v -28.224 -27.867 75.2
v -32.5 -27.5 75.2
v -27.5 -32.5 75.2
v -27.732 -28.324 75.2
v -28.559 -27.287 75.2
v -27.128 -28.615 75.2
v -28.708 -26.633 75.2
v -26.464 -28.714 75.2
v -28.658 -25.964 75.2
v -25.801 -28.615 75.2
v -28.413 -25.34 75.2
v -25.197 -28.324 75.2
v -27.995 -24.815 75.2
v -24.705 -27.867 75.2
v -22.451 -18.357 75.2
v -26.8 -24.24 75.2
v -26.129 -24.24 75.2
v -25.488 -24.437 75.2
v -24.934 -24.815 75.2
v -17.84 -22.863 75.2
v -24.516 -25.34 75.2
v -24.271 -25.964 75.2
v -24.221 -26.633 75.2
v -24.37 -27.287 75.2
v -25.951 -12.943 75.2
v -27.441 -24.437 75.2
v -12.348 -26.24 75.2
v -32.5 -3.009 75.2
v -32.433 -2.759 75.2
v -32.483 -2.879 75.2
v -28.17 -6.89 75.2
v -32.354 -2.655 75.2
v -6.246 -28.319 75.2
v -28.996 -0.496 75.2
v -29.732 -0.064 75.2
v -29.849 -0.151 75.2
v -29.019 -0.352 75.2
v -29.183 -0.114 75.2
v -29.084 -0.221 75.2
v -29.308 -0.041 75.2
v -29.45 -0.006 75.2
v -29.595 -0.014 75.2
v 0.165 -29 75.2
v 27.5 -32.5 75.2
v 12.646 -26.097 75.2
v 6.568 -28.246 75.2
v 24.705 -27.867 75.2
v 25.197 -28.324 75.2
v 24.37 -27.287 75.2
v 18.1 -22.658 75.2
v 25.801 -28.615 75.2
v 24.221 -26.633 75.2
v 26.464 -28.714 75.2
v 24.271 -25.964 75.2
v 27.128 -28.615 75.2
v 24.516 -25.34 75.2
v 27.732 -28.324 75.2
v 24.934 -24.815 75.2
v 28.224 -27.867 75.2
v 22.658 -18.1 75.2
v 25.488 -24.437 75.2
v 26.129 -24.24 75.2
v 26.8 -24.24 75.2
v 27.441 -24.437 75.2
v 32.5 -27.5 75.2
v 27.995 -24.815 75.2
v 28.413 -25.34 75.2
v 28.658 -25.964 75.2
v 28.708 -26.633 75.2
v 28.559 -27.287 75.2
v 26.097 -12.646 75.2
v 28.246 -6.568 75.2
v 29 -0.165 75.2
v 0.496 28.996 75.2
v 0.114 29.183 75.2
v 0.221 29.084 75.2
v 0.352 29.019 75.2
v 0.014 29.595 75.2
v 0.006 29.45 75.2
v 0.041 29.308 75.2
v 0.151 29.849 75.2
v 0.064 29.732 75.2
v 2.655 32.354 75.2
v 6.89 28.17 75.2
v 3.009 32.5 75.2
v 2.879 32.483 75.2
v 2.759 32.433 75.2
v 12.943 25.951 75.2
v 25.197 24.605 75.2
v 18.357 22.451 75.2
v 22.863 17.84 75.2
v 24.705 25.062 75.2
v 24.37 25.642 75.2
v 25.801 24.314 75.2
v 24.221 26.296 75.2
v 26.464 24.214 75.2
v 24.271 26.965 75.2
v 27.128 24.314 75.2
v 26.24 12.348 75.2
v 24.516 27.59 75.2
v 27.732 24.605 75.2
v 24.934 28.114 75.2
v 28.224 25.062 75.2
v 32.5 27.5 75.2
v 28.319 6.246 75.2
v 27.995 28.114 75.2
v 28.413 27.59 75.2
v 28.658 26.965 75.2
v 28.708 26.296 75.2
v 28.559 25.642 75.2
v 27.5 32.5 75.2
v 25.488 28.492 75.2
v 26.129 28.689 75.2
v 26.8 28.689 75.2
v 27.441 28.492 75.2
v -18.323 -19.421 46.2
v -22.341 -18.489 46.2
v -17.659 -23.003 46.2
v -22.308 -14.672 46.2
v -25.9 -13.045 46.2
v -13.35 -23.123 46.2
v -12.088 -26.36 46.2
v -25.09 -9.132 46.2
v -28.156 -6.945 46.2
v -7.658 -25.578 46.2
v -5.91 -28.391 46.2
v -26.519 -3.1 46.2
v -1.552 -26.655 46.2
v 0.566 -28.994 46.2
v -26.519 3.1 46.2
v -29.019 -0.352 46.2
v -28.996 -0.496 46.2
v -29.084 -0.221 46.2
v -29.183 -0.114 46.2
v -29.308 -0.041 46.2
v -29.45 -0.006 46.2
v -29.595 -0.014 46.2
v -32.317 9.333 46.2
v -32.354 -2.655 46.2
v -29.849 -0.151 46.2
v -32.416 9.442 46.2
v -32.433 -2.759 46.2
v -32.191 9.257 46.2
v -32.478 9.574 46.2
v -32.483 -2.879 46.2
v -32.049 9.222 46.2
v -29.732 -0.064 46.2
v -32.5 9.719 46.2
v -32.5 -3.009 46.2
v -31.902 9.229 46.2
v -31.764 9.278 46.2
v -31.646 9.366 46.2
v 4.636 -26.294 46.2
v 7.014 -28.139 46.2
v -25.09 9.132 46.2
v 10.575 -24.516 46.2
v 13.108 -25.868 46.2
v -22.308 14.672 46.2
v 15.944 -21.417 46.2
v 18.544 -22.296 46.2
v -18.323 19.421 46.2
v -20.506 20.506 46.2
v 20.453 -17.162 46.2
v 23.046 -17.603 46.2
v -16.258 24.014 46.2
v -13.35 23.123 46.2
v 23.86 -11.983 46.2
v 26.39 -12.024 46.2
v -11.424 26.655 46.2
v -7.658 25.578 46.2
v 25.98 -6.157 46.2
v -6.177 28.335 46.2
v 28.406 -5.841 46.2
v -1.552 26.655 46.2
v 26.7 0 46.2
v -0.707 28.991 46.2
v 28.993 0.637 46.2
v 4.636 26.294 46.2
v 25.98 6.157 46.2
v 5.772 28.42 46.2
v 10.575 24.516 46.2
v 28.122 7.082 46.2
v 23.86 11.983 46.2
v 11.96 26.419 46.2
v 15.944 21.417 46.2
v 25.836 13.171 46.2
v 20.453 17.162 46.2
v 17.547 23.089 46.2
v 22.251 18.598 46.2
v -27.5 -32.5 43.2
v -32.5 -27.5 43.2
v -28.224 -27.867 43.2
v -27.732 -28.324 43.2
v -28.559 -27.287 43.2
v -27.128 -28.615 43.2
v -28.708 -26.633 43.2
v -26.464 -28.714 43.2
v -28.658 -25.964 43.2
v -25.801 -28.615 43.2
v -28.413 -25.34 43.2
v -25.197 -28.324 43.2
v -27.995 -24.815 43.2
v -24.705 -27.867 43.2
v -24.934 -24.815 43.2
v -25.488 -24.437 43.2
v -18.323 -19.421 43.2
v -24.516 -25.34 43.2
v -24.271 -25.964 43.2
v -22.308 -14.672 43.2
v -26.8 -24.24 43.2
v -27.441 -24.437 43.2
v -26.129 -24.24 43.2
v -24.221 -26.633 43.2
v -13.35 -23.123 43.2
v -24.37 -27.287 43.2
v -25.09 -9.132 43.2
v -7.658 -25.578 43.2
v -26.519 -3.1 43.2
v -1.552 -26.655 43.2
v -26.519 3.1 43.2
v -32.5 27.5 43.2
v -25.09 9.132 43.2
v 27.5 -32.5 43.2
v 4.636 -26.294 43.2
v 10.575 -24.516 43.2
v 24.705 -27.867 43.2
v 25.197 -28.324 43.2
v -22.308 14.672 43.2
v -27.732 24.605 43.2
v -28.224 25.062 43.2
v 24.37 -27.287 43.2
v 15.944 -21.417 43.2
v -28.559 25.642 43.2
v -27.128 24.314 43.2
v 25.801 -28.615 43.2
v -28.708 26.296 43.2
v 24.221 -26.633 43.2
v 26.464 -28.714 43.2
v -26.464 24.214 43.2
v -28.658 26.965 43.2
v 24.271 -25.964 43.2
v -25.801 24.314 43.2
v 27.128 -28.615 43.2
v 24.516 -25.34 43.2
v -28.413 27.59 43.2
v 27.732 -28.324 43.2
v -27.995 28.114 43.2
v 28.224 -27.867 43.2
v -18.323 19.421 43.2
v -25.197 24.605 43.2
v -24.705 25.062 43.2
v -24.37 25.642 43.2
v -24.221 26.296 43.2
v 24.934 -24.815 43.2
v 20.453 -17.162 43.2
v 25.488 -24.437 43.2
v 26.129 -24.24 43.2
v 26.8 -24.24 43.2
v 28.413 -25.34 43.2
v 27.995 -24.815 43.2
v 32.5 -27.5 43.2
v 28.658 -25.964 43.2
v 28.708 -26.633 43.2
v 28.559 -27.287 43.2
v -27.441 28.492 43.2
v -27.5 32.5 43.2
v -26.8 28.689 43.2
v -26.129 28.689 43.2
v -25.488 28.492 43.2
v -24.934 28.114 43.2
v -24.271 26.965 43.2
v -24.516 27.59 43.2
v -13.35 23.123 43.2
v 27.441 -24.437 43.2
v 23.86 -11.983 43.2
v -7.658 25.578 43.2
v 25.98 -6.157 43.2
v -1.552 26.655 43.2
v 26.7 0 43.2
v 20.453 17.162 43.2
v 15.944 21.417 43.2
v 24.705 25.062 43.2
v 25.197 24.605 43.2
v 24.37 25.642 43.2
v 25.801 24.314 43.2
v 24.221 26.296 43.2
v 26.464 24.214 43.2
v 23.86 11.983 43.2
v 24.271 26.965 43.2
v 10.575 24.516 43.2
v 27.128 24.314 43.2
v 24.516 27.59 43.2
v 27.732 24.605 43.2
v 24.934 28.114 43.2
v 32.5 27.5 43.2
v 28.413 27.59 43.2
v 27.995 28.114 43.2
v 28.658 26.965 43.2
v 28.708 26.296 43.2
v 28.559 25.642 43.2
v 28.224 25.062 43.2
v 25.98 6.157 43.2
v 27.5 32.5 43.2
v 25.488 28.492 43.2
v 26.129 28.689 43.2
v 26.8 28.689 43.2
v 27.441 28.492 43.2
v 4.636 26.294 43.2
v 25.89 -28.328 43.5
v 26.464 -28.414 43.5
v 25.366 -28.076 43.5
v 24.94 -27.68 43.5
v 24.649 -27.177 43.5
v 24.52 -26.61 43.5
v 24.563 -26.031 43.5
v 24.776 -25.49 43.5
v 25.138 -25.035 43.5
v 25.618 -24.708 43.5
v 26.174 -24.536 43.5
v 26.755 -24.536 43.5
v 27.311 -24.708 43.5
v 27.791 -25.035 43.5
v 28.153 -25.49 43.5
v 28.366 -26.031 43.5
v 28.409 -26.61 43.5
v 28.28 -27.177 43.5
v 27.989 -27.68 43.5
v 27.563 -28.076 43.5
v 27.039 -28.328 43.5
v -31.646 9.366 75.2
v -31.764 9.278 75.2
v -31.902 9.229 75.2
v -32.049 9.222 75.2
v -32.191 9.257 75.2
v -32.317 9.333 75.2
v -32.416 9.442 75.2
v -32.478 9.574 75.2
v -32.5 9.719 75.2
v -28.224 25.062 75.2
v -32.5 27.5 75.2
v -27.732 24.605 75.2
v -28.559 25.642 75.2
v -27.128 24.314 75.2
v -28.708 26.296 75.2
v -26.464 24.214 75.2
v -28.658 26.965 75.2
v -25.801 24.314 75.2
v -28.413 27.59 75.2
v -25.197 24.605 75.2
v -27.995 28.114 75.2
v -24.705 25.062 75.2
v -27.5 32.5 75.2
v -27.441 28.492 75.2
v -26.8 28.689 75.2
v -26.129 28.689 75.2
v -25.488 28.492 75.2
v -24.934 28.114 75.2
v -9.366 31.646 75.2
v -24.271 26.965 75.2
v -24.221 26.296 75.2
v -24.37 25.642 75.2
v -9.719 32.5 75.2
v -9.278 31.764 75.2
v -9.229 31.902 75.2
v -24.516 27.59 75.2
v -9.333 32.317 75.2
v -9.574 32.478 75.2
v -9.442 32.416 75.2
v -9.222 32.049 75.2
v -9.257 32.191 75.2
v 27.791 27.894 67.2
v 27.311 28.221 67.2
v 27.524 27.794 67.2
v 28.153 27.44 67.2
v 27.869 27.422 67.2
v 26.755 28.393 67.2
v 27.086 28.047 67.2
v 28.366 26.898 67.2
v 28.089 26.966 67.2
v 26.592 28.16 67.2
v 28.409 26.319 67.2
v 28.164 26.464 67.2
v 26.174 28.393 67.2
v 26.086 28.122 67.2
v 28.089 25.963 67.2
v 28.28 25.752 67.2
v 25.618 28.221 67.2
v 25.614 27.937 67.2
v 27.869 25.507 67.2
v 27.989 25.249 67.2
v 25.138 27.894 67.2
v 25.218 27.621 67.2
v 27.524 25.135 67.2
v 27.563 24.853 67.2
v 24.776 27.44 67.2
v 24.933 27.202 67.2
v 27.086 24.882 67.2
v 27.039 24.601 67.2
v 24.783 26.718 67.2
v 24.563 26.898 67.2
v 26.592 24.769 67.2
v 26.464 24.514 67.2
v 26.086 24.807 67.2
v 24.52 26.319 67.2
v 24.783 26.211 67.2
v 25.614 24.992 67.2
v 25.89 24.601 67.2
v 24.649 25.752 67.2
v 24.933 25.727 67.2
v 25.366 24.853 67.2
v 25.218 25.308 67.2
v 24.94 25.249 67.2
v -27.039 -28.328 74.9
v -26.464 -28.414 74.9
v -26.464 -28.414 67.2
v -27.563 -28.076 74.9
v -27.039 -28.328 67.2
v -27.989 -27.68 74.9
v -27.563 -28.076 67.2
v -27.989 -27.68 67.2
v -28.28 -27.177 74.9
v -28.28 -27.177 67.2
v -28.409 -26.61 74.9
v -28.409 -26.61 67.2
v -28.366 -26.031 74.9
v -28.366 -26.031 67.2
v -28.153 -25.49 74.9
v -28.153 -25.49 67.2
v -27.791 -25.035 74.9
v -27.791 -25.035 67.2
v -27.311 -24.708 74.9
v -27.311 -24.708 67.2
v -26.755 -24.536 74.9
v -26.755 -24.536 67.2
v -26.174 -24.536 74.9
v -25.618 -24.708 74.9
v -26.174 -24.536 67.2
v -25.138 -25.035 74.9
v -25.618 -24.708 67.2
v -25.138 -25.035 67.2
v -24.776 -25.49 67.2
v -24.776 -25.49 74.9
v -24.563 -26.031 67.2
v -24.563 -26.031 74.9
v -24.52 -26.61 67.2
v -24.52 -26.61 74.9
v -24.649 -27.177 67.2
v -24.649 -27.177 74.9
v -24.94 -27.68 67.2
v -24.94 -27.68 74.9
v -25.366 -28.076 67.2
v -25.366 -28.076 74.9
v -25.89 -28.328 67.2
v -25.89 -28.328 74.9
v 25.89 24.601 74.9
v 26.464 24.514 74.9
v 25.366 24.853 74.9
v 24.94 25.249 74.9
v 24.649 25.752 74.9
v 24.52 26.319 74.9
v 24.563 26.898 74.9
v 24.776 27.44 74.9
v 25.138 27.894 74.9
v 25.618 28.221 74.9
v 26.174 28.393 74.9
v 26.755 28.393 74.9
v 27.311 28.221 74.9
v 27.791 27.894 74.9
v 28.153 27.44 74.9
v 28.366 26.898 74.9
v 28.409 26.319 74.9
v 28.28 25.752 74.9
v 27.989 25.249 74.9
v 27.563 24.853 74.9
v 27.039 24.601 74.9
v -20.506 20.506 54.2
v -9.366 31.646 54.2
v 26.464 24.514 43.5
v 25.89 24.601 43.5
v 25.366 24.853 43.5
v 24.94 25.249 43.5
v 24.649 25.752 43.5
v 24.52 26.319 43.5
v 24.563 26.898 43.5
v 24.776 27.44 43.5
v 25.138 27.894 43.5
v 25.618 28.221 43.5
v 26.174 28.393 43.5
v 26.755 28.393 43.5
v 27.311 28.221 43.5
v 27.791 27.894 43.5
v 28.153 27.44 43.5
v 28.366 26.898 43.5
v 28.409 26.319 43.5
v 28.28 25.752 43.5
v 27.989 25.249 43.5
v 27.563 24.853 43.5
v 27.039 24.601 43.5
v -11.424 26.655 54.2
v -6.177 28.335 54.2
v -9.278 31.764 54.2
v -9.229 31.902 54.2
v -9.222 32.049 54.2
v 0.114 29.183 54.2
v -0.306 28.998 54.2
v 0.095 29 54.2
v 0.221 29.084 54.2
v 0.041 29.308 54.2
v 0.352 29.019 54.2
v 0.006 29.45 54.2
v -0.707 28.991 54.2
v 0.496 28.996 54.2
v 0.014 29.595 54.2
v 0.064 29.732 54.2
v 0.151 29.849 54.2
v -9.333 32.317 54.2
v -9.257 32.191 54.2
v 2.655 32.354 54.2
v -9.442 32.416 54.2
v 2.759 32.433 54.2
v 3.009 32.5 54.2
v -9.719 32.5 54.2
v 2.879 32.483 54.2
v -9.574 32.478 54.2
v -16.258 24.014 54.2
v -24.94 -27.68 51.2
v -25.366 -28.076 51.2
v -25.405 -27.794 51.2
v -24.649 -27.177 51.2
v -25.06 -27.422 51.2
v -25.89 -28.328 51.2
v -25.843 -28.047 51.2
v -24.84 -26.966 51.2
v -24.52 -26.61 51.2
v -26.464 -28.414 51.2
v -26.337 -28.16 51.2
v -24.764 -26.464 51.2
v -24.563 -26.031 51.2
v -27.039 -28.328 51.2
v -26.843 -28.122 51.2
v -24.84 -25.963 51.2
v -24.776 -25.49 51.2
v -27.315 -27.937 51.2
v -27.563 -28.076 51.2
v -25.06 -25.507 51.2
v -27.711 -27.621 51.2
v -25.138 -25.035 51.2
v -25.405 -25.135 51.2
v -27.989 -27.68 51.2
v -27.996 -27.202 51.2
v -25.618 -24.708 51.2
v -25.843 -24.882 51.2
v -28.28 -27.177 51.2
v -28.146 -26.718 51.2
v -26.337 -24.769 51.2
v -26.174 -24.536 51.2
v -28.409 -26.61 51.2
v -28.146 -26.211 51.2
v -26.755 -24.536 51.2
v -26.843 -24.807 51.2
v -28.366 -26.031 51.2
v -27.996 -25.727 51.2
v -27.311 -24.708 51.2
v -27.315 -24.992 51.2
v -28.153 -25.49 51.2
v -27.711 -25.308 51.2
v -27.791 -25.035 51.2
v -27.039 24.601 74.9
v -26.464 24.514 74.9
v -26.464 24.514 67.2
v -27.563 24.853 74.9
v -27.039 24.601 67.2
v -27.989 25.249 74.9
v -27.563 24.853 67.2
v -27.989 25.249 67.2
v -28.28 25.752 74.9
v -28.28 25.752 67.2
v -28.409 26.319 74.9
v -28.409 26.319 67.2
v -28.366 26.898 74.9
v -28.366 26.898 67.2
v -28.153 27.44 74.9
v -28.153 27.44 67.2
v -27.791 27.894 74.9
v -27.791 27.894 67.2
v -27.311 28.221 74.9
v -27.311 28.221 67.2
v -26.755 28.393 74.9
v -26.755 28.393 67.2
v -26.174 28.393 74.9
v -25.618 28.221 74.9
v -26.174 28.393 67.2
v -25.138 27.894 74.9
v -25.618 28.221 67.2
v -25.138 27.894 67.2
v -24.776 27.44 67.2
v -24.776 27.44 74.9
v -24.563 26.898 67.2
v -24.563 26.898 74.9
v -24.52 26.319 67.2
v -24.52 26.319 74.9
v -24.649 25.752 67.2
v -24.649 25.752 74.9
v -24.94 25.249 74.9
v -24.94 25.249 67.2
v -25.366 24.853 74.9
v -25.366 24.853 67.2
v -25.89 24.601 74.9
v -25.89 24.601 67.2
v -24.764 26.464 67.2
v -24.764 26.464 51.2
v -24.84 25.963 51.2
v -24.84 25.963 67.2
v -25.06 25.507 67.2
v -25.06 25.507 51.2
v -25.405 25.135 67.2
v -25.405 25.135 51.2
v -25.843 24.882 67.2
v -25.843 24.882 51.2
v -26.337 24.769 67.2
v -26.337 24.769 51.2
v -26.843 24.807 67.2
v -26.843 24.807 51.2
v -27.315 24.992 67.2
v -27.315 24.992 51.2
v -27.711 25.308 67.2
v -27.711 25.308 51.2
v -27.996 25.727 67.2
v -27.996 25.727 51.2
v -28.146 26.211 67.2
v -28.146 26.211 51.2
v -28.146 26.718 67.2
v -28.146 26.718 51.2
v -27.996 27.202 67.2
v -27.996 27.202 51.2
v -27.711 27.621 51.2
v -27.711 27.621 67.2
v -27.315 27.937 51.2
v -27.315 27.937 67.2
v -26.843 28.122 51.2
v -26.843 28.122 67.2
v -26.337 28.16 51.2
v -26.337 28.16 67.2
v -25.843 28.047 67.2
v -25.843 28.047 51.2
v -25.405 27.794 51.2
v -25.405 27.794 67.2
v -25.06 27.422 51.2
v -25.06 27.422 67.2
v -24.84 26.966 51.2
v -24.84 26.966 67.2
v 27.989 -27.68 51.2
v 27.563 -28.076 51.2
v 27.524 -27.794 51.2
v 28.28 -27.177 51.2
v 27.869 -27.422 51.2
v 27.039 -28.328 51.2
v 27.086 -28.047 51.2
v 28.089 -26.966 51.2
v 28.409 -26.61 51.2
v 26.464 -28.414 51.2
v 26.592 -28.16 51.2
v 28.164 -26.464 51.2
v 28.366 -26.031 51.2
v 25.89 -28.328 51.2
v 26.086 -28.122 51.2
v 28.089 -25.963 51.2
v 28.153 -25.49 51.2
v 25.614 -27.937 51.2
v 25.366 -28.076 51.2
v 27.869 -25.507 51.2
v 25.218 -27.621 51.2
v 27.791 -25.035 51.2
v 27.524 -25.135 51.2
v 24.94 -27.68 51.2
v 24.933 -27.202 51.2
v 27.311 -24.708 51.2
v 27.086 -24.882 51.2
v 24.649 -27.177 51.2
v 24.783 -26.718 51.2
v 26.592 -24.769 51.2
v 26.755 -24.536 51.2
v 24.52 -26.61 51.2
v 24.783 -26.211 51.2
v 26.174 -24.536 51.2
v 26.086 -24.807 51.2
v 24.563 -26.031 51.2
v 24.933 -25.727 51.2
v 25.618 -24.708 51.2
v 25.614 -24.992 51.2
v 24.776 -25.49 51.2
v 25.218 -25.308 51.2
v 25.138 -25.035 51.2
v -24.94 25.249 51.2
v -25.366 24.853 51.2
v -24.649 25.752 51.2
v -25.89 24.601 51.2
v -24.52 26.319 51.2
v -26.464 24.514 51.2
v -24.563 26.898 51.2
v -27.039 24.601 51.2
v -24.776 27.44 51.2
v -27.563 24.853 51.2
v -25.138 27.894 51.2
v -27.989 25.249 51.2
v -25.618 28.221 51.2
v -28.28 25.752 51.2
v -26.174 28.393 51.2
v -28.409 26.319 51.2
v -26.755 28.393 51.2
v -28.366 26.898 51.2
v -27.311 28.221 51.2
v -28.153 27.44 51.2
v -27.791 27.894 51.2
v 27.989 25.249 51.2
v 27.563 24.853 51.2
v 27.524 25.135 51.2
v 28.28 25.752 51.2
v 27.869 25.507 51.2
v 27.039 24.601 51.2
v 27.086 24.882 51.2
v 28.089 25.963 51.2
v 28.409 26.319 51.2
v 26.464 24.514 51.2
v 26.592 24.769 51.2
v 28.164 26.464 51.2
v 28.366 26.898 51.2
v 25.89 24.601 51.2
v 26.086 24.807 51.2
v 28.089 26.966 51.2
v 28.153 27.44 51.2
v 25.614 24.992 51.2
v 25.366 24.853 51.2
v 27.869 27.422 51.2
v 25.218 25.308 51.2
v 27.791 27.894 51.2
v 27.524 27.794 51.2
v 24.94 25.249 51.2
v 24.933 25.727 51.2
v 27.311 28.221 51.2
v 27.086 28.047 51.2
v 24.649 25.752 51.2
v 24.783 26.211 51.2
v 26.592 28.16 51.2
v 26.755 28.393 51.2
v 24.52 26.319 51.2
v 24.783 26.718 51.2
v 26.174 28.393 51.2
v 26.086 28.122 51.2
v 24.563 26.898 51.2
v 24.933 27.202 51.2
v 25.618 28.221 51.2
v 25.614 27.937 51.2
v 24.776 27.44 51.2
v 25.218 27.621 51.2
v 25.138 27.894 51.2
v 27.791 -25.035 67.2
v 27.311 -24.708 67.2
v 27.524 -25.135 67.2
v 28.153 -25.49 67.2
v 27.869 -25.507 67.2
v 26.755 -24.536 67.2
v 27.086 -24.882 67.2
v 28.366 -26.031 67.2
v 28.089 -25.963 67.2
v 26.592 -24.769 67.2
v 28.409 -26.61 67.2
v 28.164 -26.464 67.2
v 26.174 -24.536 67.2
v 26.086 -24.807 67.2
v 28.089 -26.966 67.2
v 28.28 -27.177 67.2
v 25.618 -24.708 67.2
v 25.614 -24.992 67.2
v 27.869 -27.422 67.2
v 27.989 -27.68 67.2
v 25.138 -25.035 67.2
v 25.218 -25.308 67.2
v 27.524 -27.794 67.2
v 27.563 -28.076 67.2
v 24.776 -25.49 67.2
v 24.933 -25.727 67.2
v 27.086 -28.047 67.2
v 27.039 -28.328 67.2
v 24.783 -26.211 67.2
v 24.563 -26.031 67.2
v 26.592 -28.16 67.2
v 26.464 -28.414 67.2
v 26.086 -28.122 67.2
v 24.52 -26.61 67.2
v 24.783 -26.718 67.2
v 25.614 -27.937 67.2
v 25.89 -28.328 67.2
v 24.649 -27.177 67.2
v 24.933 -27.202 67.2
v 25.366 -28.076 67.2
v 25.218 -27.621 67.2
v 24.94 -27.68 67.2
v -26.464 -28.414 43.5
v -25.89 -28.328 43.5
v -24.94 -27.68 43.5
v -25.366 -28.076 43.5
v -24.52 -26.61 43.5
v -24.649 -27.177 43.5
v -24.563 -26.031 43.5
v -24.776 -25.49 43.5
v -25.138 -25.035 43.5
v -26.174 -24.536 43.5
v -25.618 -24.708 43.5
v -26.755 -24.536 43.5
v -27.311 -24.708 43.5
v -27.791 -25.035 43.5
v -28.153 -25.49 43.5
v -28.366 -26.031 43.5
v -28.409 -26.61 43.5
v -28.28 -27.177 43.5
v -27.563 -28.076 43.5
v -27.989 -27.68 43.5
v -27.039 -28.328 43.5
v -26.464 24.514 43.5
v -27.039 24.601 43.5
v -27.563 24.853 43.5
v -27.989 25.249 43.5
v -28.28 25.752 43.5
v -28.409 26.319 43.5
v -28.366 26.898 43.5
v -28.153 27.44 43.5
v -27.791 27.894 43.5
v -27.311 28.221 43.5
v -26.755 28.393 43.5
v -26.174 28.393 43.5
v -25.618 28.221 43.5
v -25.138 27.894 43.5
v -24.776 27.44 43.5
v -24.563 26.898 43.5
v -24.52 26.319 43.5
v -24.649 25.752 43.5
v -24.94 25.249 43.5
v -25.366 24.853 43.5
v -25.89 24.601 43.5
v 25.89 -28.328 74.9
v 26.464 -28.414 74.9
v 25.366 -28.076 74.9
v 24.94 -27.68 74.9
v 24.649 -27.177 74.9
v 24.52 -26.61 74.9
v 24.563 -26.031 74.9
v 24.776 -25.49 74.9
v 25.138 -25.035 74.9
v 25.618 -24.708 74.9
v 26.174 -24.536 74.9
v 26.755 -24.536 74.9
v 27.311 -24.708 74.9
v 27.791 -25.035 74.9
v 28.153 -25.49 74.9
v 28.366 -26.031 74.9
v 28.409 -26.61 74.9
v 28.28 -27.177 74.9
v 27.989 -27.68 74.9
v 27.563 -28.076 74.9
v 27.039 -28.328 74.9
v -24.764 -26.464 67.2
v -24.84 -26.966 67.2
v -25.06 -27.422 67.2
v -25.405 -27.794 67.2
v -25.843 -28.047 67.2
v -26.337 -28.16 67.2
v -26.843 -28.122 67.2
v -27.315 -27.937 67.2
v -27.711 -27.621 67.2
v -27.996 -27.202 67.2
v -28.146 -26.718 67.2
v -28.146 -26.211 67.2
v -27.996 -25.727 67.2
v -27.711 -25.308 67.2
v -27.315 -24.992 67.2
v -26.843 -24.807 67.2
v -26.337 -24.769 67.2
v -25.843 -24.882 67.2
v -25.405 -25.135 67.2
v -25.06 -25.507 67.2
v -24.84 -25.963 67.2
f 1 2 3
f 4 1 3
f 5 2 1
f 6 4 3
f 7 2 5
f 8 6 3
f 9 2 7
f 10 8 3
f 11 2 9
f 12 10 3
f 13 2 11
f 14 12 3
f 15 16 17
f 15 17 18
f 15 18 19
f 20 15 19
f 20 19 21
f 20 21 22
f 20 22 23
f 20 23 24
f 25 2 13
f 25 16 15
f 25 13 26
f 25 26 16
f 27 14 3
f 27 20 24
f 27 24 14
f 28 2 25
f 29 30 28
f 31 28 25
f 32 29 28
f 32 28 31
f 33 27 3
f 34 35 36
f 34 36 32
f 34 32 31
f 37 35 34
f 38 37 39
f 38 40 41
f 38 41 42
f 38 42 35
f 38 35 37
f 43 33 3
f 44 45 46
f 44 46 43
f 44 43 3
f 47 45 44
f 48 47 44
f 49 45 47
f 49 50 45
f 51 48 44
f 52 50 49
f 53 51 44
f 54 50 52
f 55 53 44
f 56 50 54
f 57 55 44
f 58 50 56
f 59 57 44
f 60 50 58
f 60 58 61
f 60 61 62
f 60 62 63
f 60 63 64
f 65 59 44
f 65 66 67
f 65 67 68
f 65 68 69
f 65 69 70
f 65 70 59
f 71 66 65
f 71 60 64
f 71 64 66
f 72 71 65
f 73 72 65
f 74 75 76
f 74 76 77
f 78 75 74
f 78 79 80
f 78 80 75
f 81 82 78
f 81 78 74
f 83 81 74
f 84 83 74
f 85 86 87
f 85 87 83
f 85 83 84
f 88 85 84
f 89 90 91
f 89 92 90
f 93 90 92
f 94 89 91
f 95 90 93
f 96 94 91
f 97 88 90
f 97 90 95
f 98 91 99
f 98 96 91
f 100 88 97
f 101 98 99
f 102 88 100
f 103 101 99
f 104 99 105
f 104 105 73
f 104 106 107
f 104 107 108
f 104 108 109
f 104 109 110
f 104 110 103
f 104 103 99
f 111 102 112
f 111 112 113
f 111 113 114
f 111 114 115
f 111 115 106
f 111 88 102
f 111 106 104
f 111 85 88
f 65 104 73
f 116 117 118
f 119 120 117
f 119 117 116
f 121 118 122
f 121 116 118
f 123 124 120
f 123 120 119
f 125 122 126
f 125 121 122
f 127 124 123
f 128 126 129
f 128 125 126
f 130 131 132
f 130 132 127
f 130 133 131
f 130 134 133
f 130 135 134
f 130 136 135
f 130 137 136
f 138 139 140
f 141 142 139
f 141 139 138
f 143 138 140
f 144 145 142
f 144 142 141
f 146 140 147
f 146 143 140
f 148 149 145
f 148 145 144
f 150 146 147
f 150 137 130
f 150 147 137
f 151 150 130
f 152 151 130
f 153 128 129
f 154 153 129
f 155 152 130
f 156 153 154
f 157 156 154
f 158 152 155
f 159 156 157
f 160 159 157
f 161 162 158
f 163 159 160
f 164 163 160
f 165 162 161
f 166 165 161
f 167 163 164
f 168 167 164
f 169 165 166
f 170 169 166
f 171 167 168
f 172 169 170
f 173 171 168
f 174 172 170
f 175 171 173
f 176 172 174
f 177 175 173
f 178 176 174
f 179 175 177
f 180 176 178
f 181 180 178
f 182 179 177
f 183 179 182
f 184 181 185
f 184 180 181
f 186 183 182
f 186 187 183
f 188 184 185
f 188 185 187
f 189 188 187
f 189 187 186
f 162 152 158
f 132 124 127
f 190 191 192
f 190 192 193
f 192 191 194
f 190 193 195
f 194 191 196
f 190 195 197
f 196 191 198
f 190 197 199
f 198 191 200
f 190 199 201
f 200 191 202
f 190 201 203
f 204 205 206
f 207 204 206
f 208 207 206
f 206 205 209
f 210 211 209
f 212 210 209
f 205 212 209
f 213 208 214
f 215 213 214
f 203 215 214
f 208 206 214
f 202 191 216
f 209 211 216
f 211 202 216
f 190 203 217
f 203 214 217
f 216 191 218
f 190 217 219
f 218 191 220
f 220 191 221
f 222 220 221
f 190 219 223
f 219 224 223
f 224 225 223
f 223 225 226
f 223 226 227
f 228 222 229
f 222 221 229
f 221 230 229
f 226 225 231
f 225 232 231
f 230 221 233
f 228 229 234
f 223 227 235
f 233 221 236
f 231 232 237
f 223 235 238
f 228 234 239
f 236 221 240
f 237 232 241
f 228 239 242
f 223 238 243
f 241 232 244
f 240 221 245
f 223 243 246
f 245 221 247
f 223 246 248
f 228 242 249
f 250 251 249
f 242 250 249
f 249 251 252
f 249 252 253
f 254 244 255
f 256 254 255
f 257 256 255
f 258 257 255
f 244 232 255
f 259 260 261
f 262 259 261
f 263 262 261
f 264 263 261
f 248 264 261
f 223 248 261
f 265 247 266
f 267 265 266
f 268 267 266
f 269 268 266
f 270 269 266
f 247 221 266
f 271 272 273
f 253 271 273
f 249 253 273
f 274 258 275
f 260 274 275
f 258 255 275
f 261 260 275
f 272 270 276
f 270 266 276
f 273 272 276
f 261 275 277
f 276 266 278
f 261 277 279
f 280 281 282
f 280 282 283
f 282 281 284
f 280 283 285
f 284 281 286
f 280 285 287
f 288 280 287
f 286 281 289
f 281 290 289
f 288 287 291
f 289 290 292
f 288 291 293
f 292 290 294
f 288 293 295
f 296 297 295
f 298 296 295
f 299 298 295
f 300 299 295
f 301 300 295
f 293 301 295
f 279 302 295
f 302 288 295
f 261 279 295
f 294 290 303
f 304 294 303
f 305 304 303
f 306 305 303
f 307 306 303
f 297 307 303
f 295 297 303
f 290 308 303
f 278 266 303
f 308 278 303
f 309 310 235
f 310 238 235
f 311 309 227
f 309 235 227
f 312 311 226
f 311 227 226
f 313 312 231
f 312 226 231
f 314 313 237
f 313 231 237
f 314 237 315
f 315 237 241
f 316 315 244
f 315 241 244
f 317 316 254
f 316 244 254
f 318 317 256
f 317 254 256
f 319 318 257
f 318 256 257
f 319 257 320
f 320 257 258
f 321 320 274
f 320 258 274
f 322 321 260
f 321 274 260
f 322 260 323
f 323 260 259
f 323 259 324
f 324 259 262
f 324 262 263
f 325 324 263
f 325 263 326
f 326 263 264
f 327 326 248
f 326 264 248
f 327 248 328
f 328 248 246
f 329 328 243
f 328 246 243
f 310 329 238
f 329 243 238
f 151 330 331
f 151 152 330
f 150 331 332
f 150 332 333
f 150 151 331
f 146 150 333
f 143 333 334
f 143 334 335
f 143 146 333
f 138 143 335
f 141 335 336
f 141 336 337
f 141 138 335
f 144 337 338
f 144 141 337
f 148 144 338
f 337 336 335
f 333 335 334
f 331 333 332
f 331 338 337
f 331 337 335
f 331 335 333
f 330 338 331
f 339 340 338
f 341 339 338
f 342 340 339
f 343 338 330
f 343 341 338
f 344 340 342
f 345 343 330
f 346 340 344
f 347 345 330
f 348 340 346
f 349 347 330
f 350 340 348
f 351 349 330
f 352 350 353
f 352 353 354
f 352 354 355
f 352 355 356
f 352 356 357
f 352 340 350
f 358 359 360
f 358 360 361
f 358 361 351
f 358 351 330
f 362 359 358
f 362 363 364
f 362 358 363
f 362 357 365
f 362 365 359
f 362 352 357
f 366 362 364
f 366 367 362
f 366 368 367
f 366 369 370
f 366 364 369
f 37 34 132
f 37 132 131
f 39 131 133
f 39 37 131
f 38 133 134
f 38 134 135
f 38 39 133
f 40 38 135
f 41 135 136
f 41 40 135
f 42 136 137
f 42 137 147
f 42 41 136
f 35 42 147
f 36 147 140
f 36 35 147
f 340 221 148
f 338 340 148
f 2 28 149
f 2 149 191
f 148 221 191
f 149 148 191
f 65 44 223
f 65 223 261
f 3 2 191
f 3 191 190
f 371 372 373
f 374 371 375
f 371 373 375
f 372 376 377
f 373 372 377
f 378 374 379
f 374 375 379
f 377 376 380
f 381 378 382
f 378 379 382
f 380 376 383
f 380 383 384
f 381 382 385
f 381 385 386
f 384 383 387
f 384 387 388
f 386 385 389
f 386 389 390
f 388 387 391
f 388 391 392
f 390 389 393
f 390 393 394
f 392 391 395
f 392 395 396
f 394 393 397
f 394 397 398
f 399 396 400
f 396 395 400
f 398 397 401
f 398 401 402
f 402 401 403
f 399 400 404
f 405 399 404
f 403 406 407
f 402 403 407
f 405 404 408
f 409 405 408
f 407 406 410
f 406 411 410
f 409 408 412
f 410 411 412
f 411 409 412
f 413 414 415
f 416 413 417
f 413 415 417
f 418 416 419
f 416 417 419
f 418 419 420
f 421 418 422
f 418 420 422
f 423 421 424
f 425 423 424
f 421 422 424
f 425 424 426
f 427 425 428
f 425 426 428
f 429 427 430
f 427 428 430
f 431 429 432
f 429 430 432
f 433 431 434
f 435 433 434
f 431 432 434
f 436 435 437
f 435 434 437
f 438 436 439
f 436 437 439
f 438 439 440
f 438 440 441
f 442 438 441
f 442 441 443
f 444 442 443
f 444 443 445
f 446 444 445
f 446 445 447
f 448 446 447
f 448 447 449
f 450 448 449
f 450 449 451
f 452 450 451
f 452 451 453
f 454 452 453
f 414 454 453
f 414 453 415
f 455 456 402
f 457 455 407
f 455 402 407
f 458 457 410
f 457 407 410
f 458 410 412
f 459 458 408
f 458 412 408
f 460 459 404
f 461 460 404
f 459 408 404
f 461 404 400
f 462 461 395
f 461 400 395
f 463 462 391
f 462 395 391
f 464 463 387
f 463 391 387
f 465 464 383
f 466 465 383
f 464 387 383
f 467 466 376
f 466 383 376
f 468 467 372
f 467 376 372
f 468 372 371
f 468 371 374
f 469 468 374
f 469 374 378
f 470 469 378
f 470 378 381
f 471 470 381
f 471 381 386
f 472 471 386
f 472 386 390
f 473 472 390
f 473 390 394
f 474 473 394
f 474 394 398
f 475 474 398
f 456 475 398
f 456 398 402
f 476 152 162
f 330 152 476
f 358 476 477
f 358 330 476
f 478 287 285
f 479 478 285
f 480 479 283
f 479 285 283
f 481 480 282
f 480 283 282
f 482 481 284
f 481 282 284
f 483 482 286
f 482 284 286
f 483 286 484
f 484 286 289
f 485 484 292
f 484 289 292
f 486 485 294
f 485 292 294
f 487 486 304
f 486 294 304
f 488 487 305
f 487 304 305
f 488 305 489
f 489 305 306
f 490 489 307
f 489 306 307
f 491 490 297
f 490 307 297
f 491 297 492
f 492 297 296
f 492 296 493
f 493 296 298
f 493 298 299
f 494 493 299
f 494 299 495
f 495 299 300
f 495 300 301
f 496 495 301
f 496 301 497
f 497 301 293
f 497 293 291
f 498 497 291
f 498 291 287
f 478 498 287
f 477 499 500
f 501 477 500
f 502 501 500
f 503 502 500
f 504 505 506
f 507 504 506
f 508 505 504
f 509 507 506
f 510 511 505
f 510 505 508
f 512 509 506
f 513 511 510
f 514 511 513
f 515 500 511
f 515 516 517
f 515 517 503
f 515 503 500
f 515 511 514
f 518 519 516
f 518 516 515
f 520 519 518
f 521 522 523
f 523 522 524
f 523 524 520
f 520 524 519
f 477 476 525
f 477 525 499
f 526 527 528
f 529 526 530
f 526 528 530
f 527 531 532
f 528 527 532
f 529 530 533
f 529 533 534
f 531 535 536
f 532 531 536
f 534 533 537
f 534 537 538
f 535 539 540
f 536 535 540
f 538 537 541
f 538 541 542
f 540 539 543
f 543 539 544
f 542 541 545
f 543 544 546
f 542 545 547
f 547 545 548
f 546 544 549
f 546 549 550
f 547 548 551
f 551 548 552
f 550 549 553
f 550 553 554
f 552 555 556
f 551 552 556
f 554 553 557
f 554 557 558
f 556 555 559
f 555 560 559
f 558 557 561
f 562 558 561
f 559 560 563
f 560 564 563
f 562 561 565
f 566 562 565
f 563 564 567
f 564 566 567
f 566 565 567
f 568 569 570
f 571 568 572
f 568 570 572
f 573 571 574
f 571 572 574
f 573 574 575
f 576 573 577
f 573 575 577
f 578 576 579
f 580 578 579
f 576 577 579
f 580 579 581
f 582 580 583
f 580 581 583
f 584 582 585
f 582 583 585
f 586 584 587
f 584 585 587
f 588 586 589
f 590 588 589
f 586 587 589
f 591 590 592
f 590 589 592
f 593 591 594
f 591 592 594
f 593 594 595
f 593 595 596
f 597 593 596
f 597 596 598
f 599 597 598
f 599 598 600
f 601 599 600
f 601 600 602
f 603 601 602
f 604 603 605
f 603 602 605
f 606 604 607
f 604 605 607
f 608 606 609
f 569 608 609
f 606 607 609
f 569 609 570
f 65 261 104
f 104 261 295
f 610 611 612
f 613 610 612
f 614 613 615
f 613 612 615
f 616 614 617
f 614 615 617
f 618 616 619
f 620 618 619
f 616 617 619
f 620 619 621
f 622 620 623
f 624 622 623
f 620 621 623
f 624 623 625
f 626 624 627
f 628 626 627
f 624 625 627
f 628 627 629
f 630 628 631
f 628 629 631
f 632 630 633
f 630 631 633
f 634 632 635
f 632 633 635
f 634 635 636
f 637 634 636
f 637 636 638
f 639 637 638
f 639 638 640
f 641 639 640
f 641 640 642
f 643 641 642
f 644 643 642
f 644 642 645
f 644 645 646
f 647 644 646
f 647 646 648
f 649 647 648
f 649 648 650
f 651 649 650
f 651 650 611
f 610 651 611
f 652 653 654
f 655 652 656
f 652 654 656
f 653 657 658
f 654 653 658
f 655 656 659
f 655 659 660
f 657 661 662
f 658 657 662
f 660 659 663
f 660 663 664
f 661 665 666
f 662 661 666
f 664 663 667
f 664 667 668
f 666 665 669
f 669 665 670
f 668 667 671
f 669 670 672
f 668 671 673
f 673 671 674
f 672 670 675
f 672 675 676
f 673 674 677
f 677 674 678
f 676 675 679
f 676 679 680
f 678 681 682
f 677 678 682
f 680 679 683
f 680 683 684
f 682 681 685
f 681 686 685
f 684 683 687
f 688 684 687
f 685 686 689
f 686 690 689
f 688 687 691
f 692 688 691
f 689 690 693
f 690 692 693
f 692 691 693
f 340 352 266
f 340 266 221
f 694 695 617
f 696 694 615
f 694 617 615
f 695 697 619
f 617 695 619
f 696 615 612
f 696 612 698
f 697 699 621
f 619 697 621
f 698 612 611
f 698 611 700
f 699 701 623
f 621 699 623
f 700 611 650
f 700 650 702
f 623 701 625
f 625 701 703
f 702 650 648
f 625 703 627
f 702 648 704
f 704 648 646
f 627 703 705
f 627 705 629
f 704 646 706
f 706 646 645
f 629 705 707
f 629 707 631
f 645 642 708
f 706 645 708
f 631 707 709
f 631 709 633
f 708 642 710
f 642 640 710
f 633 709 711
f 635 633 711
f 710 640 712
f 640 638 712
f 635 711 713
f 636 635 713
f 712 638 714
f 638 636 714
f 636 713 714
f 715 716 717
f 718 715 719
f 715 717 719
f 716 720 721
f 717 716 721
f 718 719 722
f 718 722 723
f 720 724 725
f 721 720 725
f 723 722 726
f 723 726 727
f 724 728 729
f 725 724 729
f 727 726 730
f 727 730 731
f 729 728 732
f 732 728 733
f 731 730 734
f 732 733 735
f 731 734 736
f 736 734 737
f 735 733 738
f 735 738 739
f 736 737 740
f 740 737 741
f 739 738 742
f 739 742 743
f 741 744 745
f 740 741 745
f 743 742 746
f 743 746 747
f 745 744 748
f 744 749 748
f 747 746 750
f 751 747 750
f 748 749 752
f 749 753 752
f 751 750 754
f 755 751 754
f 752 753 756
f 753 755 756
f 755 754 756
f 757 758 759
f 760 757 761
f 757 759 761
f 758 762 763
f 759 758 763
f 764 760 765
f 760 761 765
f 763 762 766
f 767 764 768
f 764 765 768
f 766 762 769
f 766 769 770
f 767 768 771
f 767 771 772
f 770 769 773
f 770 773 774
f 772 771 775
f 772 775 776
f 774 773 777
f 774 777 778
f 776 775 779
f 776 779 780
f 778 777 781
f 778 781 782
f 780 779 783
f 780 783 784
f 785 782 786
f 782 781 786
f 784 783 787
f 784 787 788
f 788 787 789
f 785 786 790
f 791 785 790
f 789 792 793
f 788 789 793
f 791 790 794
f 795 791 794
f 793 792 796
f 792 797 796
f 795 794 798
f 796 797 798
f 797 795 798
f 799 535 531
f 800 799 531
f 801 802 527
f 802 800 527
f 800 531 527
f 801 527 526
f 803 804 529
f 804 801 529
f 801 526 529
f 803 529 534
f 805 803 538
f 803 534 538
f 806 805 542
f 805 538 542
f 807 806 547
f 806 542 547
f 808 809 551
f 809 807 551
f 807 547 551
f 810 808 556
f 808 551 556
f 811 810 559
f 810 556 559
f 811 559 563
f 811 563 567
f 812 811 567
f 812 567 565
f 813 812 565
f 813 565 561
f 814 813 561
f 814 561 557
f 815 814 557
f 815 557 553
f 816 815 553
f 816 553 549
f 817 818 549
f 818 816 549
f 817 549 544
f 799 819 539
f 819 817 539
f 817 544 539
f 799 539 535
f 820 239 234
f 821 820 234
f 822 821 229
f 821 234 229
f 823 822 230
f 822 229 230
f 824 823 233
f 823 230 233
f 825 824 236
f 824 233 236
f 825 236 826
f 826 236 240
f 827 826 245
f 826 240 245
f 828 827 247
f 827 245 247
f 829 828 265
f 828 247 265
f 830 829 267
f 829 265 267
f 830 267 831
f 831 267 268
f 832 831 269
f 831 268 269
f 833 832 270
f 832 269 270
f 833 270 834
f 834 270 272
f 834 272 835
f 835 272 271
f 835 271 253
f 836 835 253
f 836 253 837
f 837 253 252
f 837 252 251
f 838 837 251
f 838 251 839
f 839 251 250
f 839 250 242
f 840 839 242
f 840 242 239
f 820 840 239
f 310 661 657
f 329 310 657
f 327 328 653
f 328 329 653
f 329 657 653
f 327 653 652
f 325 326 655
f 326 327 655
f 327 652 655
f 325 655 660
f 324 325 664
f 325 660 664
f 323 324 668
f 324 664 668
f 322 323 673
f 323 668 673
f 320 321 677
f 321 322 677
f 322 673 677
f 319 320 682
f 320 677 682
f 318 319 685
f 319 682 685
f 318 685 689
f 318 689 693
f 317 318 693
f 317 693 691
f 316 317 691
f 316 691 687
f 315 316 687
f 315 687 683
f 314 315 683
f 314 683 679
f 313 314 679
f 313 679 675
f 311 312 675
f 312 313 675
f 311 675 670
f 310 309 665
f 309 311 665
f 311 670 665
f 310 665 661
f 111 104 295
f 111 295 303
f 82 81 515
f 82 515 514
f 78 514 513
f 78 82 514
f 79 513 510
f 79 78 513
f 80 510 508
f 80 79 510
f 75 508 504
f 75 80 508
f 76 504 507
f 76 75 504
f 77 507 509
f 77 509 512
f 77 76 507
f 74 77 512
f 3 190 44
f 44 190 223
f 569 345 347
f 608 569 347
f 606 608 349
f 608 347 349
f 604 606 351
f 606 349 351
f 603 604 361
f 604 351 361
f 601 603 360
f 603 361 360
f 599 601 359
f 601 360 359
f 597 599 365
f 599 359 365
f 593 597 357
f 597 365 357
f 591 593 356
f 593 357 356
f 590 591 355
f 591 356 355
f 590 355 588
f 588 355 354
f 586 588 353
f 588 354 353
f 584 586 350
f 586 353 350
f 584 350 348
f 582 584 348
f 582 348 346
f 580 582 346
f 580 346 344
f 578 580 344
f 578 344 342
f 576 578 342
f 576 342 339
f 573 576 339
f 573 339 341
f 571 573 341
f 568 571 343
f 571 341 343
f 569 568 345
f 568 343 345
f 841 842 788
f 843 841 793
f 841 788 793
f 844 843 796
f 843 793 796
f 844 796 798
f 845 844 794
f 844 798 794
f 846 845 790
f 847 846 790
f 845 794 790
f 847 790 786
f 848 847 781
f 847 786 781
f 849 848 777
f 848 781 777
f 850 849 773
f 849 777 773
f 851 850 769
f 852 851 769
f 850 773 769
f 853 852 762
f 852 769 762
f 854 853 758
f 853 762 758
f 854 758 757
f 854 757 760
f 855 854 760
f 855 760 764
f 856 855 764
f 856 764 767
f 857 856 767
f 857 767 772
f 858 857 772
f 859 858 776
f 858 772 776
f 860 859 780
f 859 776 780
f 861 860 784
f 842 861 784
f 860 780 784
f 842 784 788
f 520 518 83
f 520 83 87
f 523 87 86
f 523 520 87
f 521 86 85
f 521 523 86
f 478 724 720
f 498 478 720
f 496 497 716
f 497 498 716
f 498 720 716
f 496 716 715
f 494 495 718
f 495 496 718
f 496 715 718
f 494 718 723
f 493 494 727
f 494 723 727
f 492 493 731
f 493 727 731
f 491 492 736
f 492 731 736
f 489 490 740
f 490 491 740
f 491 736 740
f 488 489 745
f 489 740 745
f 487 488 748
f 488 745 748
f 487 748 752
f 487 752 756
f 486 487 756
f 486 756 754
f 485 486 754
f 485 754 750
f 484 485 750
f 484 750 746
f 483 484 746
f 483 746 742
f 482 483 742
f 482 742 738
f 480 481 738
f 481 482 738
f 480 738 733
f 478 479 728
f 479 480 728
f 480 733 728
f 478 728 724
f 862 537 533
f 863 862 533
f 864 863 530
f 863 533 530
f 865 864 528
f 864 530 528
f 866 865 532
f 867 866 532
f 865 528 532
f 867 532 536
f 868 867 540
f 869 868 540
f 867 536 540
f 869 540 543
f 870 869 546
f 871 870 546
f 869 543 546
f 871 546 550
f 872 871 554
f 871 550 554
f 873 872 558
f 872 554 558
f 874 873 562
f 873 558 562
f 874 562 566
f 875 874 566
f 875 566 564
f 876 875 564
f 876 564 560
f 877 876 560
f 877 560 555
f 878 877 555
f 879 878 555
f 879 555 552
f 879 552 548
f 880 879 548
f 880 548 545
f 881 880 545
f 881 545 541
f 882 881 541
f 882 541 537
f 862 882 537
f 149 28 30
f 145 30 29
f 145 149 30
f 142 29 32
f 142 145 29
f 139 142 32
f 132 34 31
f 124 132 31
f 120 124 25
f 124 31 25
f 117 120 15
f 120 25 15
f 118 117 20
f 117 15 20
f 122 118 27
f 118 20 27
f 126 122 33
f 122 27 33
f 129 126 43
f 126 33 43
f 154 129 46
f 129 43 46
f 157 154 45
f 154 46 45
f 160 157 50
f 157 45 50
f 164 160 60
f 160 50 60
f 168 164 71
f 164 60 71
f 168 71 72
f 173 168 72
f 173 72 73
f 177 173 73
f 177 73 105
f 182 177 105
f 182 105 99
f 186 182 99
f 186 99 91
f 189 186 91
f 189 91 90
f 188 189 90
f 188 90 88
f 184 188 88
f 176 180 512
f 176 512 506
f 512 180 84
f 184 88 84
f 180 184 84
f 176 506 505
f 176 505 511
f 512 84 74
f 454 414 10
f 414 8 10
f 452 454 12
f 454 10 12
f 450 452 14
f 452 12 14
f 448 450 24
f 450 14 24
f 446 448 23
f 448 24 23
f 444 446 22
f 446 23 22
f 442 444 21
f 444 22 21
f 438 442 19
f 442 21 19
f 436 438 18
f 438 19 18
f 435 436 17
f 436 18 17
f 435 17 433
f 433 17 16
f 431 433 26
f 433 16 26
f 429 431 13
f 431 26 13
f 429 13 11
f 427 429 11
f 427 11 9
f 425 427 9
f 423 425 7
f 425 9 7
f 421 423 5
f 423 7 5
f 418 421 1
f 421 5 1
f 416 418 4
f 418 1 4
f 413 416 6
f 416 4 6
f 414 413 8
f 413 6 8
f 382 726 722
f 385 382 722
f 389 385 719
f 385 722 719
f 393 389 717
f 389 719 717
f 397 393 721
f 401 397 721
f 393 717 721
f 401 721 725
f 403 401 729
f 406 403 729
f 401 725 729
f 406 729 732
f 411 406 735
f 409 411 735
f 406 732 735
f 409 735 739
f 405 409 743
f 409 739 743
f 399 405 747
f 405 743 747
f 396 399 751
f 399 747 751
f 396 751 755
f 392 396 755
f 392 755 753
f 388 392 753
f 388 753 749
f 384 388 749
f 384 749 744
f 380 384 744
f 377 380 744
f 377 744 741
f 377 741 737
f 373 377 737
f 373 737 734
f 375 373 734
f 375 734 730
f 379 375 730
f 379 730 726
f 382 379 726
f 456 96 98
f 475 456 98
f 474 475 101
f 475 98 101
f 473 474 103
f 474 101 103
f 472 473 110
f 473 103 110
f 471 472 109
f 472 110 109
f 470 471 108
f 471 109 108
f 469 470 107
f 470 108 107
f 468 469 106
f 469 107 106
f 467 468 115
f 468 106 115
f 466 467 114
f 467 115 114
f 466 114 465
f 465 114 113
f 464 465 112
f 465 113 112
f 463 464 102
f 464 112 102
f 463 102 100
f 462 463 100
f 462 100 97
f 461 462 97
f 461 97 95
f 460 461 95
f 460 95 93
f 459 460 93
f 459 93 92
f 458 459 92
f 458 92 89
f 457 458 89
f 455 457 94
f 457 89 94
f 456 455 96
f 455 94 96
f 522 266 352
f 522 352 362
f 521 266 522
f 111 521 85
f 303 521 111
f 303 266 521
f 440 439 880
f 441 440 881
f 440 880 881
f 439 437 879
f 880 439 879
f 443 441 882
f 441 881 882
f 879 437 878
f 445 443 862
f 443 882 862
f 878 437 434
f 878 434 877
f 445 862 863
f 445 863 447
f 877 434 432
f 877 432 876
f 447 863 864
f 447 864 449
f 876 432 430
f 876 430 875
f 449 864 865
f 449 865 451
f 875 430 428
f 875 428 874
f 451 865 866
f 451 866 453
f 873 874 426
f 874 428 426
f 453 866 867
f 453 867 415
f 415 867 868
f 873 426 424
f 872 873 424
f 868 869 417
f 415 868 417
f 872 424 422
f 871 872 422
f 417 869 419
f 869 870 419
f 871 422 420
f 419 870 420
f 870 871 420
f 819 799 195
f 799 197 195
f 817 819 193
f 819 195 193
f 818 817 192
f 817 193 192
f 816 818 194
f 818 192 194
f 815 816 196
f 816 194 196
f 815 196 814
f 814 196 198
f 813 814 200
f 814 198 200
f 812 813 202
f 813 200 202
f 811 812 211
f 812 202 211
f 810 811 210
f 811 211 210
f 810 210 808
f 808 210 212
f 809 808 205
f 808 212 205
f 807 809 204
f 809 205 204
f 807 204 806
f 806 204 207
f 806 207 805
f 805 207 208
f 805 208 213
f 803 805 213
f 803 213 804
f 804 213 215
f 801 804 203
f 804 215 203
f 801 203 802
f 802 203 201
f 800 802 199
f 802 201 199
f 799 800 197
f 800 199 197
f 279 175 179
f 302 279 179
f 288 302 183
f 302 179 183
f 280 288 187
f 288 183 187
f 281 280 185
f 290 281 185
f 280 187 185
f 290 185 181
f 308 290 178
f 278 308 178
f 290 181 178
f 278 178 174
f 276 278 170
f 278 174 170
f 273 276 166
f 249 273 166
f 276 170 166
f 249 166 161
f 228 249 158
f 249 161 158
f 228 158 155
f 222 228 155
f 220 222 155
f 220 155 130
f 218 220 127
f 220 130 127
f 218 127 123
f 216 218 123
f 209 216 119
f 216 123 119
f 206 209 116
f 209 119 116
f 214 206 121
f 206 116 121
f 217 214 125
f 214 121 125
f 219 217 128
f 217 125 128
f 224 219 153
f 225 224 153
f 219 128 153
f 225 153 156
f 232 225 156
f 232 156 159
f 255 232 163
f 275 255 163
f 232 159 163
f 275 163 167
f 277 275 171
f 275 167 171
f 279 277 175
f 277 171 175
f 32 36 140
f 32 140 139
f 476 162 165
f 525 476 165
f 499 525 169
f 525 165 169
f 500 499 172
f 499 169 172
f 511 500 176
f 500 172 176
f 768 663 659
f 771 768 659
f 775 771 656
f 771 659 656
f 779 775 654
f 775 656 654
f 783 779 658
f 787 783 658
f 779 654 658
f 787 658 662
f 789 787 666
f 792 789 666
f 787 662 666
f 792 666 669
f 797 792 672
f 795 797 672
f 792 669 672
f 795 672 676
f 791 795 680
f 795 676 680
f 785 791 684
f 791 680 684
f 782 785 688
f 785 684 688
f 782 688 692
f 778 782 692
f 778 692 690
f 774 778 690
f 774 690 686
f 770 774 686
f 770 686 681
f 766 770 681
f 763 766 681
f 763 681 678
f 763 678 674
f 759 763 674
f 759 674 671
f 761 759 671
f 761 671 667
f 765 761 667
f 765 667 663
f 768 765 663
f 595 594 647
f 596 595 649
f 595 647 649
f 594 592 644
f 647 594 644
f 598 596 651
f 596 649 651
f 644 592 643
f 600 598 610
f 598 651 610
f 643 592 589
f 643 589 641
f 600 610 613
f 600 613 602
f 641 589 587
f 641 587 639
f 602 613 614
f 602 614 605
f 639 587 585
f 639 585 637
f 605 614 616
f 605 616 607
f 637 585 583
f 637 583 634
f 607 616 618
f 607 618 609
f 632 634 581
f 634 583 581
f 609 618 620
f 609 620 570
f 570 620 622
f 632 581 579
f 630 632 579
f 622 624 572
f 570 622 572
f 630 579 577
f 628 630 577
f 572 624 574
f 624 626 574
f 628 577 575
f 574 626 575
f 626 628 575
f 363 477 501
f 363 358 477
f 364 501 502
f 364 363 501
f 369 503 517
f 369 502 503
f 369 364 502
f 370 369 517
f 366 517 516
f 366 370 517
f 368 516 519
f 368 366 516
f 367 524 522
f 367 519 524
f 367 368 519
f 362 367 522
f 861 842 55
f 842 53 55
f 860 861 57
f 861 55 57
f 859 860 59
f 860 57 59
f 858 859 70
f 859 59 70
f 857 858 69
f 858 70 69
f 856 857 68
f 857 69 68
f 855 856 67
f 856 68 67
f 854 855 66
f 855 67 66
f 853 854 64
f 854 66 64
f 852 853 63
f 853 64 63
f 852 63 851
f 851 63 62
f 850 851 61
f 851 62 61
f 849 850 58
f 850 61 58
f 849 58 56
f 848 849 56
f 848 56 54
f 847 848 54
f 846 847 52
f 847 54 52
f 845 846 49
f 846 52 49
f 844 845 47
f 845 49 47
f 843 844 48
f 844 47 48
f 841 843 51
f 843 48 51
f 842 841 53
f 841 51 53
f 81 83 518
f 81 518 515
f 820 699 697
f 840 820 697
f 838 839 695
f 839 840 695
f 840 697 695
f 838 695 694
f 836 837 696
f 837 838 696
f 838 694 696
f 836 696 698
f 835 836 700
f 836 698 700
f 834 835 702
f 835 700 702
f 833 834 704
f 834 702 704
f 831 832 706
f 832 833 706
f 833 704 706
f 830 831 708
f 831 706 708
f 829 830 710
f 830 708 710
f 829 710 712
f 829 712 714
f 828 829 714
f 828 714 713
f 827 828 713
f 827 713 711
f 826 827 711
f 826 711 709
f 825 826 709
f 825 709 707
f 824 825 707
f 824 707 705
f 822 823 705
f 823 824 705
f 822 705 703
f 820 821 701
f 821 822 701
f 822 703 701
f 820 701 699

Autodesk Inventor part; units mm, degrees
ref_plane "РабПлоскость1" through (0, 0, 43.2) normal (0, 0, 1) x (1, 0, 0)
sketch "Эскиз1" plane through (0, 0, 43.2) normal (0, 0, 1) x (1, 0, 0)
  circle A0 centre (0, 0) radius 12.5 construction
  circle A1 centre (26.4645, -26.4645) radius 1.95 construction
  circle A2 centre (-26.4645, 26.4645) radius 1.95 construction
  circle A3 centre (26.4645, 26.4645) radius 1.95 construction
  circle A4 centre (-26.4645, -26.4645) radius 1.95 construction
  circle A5 centre (15.35, -15.35) radius 3.3 construction
  circle A6 centre (-15.35, 15.35) radius 3.3 construction
  circle A7 centre (15.35, 15.35) radius 3.3 construction
  circle A8 centre (-15.35, -15.35) radius 3.3 construction
  line L0 (-32.5, 27.5) -> (-32.5, -27.5) projected
  line L1 (-32.5, -27.5) -> (-27.5, -32.5) projected
  line L2 (-27.5, -32.5) -> (27.5, -32.5) projected
  line L3 (27.5, -32.5) -> (32.5, -27.5) projected
  line L4 (32.5, -27.5) -> (32.5, 27.5) projected
  line L5 (32.5, 27.5) -> (27.5, 32.5) projected
  line L6 (27.5, 32.5) -> (-27.5, 32.5) projected
  line L7 (-27.5, 32.5) -> (-32.5, 27.5) projected
  circle A9 centre (-26.4645, 26.4645) radius 1.7
  circle A10 centre (-26.4645, -26.4645) radius 1.7
  circle A11 centre (26.4645, -26.4645) radius 1.7
  circle A12 centre (26.4645, 26.4645) radius 1.7
  point P0 (0, 0)
  dimension "d0" = 3.4
  dimension "d3" = 360
ref_plane "РабПлоскость2" through (-24, -24, 68.2) normal (0, 0, 1) x (1, 0, 0)
ref_plane "РабПлоскость3" through (-25, -25, 76.2) normal (0, 0, 1) x (1, 0, 0)
ref_plane "РабПлоскость4" through (-25, -25, 75.2) normal (0, 0, 1) x (1, 0, 0)
extrude "Выдавливание1" add sketch "Эскиз1" along normal up to surface (32 mm away)
sketch "Эскиз2" plane through (-27.5, -32.5, 75.2) normal (0, 0, 1) x (1, 0, 0)
  circle A0 centre (27.5, 32.5) radius 26.7
  circle A1 centre (27.5, 32.5) radius 26 construction
  point P0 (27.5, 32.5)
  dimension "d7" = 0.7
extrude "Выдавливание2" cut sketch "Эскиз2" against normal through all
sketch "Эскиз3" plane through (-27.5, -32.5, 75.2) normal (0, 0, 1) x (1, 0, 0)
  circle A0 centre (27.5, 32.5) radius 29
  point P0 (27.5, 32.5)
  dimension "d10" = 58
extrude "Выдавливание3" cut sketch "Эскиз3" against normal blind 29
sketch "Эскиз4" plane through (-27.5, -32.5, 75.2) normal (0, 0, 1) x (1, 0, 0)
  line L0 (27.5, 32.5) -> (-17.4216, 32.5) construction
  line L1 (27.5, 32.5) -> (27.5, 86.8175) construction
  line L2 (-5, 5) -> (-5, 60) construction
  line L3 (30.3015, 65) -> (-5, 29.6985)
  line L4 (-5, 29.6985) -> (-10.6569, 35.3553)
  line L5 (-10.6569, 35.3553) -> (24.6447, 70.6569)
  line L6 (24.6447, 70.6569) -> (30.3015, 65)
  line L7 (30.3015, 65) -> (-10.6569, 35.3553) construction
  line L8 (-5, 29.6985) -> (24.6447, 70.6569) construction
  line L9 (-5, 60) -> (0, 65) construction
  line L10 (0, 65) -> (55, 65) construction
  circle A0 centre (27.5, 32.5) radius 29 construction
  point P0 (9.8223, 50.1777)
  dimension "d16" = 8
extrude "Выдавливание4" cut sketch "Эскиз4" against normal up to surface (29 mm away)
sketch "Эскиз5" plane through (-27.5, -32.5, 46.2) normal (0, 0, 1) x (1, 0, 0)
  arc A0 (-1.4914, 33.2071) -> (26.7929, 61.4914) centre (27.5, 32.5) ccw projected
  line L0 (30.3015, 65) -> (26.7929, 61.4914) projected
  line L1 (18.9878, 65) -> (30.3015, 65) projected
  line L2 (-5, 41.0122) -> (18.9878, 65) projected
  line L3 (-5, 29.6985) -> (-5, 41.0122) projected
  line L4 (-1.4914, 33.2071) -> (-5, 29.6985) projected
  circle A1 centre (27.5, 32.5) radius 26.7 projected
  circle A2 centre (27.5, 32.5) radius 29
  point P0 (27.5, 32.5)
  point P1 (6.9939, 53.0061)
extrude "Выдавливание5" add sketch "Эскиз5" along normal blind 8 contours L2 L1 L0 A2
fillet "Сопряжение1" radius 0.5 6 edges at (-0.7071, 28.9914, 64.7) (-28.9914, 0.7071, 60.7) (-8.5122, 32.5, 64.7) (2.8015, 32.5, 64.7) (-32.5, -2.8015, 60.7) (-32.5, 8.5122, 60.7)
sketch "Эскиз6" plane through (-27.5, -32.5, 75.2) normal (0, 0, 1) x (1, 0, 0)
  circle A0 centre (1.0355, 58.9645) radius 1.7 construction
  circle A1 centre (53.9645, 58.9645) radius 1.7 construction
  circle A2 centre (53.9645, 6.0355) radius 1.7 construction
  circle A3 centre (1.0355, 6.0355) radius 1.7 construction
  point P0 (27.5, 32.5)
hole "Отверстие1" at (-26.4645, 26.4645, 75.2) at (26.4645, 26.4645, 75.2) at (26.4645, -26.4645, 75.2) at (-26.4645, -26.4645, 75.2) direction (0, 0, -1) diameter 3.9 depth 8 countersink diameter 4.5 countersink angle 90
ref_plane "РабПлоскость5" through (-27.5, -32.5, 59.2) normal (0, 0, 1) x (1, 0, 0)
mirror "Зеркальное отражение1" about plane through (-27.5, -32.5, 59.2) normal (0, 0, 1) of "Отверстие1"
properties part number "Корпус" material "По умолчанию1"
